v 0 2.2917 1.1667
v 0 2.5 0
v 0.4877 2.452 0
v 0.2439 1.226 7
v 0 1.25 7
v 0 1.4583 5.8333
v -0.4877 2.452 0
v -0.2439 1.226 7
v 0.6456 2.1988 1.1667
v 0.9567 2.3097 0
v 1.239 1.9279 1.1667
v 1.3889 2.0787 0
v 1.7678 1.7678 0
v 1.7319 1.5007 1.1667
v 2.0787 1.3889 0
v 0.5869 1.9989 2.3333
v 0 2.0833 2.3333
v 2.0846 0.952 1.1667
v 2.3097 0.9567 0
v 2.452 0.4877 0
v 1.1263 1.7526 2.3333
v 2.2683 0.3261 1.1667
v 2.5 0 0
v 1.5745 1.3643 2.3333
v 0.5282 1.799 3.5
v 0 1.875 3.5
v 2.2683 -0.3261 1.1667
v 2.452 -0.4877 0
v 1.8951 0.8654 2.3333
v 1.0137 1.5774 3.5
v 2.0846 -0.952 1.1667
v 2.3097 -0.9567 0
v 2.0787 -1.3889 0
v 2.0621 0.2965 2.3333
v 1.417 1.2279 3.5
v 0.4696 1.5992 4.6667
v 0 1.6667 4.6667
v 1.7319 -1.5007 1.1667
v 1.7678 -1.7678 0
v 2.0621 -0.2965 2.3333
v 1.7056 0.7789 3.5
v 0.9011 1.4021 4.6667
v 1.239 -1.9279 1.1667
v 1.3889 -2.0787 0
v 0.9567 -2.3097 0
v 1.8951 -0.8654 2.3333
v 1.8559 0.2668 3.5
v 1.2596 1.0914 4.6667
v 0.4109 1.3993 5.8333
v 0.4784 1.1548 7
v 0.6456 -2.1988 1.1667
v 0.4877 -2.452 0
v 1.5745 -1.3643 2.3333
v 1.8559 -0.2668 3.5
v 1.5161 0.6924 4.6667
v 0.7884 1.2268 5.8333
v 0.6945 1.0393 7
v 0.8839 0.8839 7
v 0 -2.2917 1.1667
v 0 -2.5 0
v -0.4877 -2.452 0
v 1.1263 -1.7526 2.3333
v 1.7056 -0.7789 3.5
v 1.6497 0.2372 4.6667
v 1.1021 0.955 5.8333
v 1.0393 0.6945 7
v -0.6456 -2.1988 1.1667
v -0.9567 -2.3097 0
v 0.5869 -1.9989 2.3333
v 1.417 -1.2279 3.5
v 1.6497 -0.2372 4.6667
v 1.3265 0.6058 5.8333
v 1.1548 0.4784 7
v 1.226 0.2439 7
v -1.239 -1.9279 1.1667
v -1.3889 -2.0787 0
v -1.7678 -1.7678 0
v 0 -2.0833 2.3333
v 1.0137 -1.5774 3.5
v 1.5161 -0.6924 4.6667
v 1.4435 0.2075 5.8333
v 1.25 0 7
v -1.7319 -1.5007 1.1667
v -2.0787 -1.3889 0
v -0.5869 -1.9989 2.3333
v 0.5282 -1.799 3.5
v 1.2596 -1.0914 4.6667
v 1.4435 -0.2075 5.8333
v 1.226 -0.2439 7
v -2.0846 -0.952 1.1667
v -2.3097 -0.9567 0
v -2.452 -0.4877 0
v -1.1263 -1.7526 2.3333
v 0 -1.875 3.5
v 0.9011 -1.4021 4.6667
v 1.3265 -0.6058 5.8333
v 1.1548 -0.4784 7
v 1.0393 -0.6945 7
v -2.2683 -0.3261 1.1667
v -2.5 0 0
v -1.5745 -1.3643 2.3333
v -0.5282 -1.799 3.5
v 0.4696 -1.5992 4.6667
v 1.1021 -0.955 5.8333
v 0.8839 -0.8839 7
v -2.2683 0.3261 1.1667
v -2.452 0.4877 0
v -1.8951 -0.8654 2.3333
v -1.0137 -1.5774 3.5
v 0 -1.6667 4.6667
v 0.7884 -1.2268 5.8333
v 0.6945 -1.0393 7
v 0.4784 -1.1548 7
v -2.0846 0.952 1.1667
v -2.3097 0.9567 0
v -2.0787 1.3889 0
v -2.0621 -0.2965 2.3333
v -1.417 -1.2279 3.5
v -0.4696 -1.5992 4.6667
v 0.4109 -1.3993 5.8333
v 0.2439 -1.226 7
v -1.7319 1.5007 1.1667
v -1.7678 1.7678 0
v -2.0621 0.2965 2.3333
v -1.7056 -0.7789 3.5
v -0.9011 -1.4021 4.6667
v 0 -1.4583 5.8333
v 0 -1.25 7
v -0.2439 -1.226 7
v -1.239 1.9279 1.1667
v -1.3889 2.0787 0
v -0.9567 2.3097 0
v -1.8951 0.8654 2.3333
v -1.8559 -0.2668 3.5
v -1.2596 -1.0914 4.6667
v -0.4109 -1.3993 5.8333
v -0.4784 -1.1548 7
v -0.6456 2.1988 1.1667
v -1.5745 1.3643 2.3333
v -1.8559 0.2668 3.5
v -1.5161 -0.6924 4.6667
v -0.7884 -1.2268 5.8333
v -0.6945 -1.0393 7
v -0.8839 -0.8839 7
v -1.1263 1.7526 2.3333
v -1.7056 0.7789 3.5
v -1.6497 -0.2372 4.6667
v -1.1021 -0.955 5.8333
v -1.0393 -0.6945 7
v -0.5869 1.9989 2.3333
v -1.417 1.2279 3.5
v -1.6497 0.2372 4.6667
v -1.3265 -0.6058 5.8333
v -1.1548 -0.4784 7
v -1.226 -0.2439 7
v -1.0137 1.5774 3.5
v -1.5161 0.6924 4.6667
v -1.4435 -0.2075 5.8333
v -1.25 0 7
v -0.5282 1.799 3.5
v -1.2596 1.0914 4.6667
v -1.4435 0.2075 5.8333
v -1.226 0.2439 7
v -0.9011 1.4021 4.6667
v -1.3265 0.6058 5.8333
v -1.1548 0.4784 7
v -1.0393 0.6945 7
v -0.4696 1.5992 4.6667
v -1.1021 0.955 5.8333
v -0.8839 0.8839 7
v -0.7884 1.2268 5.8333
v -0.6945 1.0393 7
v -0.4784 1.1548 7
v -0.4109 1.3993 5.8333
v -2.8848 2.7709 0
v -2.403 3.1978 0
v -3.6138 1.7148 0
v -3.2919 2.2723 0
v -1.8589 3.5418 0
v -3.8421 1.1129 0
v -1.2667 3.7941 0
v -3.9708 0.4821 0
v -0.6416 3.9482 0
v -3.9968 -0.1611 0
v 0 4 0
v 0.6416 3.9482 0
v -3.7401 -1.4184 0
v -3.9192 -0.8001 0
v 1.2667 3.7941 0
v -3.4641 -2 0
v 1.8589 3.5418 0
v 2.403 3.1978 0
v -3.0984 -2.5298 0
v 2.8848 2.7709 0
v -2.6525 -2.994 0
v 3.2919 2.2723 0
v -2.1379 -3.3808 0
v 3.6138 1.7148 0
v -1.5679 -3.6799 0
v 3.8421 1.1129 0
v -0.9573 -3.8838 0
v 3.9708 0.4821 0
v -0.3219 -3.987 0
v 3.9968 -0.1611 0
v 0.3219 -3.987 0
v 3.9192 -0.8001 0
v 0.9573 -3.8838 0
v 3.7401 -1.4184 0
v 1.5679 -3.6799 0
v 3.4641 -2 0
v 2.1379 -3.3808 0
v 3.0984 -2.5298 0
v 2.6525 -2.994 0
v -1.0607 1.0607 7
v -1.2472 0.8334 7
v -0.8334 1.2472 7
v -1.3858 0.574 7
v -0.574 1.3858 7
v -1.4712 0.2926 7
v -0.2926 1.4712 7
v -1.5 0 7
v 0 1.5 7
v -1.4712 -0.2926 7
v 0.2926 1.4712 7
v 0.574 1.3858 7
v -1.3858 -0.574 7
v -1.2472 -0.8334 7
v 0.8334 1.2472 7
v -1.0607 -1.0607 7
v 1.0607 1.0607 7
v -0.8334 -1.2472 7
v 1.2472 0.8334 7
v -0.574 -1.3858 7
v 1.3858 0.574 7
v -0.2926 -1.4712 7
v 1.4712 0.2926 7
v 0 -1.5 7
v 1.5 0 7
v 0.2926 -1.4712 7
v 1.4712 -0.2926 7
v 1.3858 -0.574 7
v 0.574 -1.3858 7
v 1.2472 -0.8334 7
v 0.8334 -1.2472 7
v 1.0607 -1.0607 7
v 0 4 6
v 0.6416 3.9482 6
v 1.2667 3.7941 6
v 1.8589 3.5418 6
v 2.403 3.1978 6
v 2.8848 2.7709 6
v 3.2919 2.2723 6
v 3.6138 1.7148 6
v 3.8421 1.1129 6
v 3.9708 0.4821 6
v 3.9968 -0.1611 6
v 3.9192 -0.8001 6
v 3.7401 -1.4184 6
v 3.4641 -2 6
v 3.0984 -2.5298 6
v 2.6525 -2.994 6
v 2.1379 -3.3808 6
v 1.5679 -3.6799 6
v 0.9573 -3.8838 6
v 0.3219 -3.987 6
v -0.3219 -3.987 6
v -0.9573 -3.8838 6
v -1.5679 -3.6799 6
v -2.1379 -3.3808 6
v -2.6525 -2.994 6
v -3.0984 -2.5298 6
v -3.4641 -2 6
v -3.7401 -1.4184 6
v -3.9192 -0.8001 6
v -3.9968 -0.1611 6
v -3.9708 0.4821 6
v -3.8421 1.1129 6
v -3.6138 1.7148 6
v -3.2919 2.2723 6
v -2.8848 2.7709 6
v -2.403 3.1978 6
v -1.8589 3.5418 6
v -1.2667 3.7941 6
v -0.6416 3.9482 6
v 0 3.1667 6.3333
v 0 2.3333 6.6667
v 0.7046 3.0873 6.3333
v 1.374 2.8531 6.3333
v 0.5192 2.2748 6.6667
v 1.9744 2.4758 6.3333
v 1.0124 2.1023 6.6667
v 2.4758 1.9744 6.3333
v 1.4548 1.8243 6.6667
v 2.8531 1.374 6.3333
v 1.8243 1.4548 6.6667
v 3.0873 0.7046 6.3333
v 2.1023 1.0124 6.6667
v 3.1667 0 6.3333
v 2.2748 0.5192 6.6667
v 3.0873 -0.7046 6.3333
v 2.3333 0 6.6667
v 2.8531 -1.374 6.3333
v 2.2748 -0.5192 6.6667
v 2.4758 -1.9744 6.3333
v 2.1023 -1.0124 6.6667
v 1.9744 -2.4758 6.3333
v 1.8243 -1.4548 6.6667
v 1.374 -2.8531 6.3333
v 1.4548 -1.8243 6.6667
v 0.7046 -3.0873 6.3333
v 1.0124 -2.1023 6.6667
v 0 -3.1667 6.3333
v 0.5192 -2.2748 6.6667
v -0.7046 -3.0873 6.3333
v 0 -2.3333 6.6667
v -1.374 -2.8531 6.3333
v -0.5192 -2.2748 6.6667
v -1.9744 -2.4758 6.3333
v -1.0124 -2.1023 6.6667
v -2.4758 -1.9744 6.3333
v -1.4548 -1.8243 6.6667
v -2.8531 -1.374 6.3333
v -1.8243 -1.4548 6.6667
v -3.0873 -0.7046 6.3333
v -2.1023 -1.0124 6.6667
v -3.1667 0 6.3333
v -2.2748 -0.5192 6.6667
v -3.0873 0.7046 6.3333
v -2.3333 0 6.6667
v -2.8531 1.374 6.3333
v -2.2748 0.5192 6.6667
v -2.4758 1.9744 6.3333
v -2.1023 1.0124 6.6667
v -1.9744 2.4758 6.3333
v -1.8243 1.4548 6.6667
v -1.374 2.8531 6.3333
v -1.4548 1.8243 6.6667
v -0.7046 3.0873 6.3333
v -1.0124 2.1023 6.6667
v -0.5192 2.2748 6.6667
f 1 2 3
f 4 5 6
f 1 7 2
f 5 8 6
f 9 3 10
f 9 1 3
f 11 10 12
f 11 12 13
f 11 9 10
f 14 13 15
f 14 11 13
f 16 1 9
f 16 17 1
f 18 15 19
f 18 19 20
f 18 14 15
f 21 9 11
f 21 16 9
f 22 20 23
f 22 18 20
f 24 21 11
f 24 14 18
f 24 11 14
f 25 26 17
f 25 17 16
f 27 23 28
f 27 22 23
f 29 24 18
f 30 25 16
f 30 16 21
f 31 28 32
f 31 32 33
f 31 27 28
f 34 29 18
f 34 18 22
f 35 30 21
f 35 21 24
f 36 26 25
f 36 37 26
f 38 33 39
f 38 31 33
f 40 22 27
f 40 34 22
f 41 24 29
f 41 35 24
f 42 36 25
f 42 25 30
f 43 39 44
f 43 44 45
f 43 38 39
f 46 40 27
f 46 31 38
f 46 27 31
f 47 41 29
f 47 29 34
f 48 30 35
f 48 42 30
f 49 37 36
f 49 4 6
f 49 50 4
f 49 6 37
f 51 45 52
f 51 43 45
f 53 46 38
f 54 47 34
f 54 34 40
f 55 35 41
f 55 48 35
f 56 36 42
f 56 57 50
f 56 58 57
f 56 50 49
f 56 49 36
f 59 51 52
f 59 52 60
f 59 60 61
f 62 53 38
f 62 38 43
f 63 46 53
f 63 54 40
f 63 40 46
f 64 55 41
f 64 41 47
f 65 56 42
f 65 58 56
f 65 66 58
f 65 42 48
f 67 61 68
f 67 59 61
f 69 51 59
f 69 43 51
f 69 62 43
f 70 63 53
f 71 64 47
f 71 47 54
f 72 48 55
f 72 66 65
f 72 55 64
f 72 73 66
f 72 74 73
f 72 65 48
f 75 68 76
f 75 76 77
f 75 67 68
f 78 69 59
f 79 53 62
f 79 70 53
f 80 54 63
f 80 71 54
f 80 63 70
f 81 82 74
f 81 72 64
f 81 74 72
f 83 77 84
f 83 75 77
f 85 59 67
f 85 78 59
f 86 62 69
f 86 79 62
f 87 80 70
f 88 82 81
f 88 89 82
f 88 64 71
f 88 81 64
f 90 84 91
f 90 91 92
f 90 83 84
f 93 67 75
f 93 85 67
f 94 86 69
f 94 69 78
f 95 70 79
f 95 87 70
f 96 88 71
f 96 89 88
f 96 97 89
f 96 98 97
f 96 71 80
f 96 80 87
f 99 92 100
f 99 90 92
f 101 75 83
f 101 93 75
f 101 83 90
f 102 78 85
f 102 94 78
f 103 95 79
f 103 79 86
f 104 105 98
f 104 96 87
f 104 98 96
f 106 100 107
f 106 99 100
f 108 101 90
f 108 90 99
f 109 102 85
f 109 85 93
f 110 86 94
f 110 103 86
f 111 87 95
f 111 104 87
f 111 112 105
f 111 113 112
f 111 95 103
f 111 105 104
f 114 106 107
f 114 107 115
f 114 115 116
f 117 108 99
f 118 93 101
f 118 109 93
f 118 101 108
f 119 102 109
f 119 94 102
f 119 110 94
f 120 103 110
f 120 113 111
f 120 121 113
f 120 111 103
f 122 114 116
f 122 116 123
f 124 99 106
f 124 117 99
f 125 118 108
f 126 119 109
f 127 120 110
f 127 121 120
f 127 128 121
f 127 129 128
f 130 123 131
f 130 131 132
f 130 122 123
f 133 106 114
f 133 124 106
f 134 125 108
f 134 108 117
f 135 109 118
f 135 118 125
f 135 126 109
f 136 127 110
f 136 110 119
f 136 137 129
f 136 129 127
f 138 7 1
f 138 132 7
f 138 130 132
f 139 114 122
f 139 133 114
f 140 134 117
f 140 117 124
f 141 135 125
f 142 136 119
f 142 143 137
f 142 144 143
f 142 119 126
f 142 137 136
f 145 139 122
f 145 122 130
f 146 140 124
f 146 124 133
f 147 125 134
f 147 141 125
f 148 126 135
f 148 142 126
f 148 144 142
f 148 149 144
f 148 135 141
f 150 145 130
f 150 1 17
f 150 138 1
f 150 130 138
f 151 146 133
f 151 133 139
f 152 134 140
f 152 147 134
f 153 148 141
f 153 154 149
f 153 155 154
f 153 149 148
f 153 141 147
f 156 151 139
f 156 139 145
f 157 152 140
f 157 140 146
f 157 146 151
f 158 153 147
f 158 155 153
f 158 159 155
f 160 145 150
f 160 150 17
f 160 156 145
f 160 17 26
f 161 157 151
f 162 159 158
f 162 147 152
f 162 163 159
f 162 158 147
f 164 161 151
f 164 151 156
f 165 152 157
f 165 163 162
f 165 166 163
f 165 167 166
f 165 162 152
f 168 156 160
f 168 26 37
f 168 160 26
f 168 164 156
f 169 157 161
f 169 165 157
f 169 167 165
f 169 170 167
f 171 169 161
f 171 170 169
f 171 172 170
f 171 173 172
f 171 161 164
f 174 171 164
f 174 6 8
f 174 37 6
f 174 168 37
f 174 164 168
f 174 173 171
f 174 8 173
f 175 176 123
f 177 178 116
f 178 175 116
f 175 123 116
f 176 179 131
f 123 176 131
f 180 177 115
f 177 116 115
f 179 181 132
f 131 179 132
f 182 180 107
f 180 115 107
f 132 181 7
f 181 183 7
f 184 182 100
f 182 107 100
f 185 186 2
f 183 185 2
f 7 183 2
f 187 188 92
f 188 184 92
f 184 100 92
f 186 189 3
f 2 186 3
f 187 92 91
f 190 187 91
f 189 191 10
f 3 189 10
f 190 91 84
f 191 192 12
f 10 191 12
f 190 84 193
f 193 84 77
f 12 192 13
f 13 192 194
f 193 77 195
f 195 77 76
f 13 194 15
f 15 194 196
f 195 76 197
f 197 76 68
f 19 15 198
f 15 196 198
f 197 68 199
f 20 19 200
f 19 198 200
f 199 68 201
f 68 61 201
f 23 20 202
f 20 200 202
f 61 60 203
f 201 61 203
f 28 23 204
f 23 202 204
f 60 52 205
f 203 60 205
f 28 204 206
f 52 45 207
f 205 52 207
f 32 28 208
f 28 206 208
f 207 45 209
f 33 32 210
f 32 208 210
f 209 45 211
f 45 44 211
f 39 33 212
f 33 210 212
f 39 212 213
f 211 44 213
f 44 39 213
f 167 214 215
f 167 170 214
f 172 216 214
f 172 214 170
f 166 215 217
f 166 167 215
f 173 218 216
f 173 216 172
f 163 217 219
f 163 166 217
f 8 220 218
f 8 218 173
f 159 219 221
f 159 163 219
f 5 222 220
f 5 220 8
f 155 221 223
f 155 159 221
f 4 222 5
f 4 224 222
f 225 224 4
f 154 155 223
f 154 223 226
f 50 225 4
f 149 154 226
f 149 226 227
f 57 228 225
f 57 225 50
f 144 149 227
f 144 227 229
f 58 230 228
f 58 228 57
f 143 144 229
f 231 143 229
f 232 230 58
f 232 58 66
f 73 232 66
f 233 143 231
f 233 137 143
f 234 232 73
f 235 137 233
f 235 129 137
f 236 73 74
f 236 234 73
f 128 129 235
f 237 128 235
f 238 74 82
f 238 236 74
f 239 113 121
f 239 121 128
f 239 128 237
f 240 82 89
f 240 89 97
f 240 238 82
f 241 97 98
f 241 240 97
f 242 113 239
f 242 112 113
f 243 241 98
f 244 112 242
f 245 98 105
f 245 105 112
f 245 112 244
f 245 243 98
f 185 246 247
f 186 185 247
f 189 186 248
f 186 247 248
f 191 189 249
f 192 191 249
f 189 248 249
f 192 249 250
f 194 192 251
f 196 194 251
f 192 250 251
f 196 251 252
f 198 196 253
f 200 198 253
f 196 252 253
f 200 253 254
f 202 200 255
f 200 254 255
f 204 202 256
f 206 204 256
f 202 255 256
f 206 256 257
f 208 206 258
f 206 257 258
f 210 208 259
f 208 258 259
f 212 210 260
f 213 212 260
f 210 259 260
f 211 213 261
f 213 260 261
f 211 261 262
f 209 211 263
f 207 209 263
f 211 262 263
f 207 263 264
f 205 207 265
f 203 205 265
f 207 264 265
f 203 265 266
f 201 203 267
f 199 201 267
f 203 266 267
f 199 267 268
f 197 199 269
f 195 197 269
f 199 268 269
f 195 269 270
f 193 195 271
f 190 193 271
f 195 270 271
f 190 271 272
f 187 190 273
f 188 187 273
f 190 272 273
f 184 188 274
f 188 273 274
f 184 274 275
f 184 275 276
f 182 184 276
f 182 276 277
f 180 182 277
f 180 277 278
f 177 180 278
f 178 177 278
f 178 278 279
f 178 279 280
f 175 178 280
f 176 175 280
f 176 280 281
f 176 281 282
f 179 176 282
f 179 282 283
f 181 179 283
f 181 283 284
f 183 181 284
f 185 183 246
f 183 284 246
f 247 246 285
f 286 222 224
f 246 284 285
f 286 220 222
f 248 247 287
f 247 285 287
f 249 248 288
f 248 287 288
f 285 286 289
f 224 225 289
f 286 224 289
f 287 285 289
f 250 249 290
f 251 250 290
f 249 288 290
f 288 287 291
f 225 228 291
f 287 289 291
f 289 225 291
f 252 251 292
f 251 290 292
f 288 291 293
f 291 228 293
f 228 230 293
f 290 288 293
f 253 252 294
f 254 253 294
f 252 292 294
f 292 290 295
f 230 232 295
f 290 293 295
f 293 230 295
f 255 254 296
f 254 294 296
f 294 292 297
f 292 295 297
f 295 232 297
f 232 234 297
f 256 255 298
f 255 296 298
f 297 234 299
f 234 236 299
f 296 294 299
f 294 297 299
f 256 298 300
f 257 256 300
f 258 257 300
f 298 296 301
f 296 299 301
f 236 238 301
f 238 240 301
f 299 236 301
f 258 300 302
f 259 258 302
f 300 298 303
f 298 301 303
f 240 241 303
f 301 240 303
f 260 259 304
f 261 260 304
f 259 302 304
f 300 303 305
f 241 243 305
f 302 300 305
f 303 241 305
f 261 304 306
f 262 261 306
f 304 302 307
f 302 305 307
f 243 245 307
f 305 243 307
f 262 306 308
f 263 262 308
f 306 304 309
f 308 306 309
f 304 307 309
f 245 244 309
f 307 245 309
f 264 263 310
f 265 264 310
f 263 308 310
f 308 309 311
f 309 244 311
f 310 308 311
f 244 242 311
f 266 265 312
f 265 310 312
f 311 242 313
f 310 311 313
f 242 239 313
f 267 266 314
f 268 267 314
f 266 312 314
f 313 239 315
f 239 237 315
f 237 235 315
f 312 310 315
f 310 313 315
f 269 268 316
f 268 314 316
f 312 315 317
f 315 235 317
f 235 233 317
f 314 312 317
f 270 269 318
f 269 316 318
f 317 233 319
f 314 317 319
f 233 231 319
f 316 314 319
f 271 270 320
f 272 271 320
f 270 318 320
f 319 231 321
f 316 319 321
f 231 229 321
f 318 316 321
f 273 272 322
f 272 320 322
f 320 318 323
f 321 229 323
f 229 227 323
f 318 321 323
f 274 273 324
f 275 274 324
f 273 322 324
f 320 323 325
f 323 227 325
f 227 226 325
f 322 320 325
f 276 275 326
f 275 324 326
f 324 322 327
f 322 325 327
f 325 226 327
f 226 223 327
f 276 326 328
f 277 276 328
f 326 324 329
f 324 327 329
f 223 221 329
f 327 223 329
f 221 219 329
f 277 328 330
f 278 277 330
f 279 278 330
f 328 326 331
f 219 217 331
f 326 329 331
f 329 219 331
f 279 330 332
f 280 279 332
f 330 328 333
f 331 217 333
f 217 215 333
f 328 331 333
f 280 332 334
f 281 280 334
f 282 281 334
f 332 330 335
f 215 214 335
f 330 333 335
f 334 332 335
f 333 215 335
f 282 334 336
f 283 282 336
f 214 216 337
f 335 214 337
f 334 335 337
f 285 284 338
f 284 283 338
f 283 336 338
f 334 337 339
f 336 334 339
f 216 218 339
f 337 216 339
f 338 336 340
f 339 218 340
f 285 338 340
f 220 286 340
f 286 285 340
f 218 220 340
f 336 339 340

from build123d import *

# Parameters (mm, degrees)
F1_W     = 4
F1_H     = 7
F5_SIZE2 = 2.5
F5_SIZE  = 1


with BuildPart() as f2:
    # F1 (on Right) → F2 (revolve)
    with BuildSketch(Plane.YZ):
        with Locations((2, 3.5)):
            Rectangle(F1_W, F1_H)
    revolve(axis=Axis((0, 0, 3.5), (0, 0, -1)))


with BuildPart() as f3:
    # F0 (on Right) → F3 (revolve)
    with BuildSketch(Plane.YZ):
        Polygon((0, 7), (0, 0), (2.5, 0), (1.25, 7), align=None)
    revolve(axis=Axis((0, 0, 3.5), (0, 0, -1)))


with BuildPart() as f2_1:
    add(f2.part)

    # F4: cut F3
    add(f3.part, mode=Mode.SUBTRACT)

    # F5
    f5_edges = [f2_1.edges().sort_by_distance(p)[0] for p in [
        (0, -4, 7),
    ]]
    f5_side = f2_1.faces().sort_by_distance((0, -4, 3.5))[0]
    chamfer(f5_edges, length=F5_SIZE, length2=F5_SIZE2, reference=f5_side)


solid = f2_1.part
